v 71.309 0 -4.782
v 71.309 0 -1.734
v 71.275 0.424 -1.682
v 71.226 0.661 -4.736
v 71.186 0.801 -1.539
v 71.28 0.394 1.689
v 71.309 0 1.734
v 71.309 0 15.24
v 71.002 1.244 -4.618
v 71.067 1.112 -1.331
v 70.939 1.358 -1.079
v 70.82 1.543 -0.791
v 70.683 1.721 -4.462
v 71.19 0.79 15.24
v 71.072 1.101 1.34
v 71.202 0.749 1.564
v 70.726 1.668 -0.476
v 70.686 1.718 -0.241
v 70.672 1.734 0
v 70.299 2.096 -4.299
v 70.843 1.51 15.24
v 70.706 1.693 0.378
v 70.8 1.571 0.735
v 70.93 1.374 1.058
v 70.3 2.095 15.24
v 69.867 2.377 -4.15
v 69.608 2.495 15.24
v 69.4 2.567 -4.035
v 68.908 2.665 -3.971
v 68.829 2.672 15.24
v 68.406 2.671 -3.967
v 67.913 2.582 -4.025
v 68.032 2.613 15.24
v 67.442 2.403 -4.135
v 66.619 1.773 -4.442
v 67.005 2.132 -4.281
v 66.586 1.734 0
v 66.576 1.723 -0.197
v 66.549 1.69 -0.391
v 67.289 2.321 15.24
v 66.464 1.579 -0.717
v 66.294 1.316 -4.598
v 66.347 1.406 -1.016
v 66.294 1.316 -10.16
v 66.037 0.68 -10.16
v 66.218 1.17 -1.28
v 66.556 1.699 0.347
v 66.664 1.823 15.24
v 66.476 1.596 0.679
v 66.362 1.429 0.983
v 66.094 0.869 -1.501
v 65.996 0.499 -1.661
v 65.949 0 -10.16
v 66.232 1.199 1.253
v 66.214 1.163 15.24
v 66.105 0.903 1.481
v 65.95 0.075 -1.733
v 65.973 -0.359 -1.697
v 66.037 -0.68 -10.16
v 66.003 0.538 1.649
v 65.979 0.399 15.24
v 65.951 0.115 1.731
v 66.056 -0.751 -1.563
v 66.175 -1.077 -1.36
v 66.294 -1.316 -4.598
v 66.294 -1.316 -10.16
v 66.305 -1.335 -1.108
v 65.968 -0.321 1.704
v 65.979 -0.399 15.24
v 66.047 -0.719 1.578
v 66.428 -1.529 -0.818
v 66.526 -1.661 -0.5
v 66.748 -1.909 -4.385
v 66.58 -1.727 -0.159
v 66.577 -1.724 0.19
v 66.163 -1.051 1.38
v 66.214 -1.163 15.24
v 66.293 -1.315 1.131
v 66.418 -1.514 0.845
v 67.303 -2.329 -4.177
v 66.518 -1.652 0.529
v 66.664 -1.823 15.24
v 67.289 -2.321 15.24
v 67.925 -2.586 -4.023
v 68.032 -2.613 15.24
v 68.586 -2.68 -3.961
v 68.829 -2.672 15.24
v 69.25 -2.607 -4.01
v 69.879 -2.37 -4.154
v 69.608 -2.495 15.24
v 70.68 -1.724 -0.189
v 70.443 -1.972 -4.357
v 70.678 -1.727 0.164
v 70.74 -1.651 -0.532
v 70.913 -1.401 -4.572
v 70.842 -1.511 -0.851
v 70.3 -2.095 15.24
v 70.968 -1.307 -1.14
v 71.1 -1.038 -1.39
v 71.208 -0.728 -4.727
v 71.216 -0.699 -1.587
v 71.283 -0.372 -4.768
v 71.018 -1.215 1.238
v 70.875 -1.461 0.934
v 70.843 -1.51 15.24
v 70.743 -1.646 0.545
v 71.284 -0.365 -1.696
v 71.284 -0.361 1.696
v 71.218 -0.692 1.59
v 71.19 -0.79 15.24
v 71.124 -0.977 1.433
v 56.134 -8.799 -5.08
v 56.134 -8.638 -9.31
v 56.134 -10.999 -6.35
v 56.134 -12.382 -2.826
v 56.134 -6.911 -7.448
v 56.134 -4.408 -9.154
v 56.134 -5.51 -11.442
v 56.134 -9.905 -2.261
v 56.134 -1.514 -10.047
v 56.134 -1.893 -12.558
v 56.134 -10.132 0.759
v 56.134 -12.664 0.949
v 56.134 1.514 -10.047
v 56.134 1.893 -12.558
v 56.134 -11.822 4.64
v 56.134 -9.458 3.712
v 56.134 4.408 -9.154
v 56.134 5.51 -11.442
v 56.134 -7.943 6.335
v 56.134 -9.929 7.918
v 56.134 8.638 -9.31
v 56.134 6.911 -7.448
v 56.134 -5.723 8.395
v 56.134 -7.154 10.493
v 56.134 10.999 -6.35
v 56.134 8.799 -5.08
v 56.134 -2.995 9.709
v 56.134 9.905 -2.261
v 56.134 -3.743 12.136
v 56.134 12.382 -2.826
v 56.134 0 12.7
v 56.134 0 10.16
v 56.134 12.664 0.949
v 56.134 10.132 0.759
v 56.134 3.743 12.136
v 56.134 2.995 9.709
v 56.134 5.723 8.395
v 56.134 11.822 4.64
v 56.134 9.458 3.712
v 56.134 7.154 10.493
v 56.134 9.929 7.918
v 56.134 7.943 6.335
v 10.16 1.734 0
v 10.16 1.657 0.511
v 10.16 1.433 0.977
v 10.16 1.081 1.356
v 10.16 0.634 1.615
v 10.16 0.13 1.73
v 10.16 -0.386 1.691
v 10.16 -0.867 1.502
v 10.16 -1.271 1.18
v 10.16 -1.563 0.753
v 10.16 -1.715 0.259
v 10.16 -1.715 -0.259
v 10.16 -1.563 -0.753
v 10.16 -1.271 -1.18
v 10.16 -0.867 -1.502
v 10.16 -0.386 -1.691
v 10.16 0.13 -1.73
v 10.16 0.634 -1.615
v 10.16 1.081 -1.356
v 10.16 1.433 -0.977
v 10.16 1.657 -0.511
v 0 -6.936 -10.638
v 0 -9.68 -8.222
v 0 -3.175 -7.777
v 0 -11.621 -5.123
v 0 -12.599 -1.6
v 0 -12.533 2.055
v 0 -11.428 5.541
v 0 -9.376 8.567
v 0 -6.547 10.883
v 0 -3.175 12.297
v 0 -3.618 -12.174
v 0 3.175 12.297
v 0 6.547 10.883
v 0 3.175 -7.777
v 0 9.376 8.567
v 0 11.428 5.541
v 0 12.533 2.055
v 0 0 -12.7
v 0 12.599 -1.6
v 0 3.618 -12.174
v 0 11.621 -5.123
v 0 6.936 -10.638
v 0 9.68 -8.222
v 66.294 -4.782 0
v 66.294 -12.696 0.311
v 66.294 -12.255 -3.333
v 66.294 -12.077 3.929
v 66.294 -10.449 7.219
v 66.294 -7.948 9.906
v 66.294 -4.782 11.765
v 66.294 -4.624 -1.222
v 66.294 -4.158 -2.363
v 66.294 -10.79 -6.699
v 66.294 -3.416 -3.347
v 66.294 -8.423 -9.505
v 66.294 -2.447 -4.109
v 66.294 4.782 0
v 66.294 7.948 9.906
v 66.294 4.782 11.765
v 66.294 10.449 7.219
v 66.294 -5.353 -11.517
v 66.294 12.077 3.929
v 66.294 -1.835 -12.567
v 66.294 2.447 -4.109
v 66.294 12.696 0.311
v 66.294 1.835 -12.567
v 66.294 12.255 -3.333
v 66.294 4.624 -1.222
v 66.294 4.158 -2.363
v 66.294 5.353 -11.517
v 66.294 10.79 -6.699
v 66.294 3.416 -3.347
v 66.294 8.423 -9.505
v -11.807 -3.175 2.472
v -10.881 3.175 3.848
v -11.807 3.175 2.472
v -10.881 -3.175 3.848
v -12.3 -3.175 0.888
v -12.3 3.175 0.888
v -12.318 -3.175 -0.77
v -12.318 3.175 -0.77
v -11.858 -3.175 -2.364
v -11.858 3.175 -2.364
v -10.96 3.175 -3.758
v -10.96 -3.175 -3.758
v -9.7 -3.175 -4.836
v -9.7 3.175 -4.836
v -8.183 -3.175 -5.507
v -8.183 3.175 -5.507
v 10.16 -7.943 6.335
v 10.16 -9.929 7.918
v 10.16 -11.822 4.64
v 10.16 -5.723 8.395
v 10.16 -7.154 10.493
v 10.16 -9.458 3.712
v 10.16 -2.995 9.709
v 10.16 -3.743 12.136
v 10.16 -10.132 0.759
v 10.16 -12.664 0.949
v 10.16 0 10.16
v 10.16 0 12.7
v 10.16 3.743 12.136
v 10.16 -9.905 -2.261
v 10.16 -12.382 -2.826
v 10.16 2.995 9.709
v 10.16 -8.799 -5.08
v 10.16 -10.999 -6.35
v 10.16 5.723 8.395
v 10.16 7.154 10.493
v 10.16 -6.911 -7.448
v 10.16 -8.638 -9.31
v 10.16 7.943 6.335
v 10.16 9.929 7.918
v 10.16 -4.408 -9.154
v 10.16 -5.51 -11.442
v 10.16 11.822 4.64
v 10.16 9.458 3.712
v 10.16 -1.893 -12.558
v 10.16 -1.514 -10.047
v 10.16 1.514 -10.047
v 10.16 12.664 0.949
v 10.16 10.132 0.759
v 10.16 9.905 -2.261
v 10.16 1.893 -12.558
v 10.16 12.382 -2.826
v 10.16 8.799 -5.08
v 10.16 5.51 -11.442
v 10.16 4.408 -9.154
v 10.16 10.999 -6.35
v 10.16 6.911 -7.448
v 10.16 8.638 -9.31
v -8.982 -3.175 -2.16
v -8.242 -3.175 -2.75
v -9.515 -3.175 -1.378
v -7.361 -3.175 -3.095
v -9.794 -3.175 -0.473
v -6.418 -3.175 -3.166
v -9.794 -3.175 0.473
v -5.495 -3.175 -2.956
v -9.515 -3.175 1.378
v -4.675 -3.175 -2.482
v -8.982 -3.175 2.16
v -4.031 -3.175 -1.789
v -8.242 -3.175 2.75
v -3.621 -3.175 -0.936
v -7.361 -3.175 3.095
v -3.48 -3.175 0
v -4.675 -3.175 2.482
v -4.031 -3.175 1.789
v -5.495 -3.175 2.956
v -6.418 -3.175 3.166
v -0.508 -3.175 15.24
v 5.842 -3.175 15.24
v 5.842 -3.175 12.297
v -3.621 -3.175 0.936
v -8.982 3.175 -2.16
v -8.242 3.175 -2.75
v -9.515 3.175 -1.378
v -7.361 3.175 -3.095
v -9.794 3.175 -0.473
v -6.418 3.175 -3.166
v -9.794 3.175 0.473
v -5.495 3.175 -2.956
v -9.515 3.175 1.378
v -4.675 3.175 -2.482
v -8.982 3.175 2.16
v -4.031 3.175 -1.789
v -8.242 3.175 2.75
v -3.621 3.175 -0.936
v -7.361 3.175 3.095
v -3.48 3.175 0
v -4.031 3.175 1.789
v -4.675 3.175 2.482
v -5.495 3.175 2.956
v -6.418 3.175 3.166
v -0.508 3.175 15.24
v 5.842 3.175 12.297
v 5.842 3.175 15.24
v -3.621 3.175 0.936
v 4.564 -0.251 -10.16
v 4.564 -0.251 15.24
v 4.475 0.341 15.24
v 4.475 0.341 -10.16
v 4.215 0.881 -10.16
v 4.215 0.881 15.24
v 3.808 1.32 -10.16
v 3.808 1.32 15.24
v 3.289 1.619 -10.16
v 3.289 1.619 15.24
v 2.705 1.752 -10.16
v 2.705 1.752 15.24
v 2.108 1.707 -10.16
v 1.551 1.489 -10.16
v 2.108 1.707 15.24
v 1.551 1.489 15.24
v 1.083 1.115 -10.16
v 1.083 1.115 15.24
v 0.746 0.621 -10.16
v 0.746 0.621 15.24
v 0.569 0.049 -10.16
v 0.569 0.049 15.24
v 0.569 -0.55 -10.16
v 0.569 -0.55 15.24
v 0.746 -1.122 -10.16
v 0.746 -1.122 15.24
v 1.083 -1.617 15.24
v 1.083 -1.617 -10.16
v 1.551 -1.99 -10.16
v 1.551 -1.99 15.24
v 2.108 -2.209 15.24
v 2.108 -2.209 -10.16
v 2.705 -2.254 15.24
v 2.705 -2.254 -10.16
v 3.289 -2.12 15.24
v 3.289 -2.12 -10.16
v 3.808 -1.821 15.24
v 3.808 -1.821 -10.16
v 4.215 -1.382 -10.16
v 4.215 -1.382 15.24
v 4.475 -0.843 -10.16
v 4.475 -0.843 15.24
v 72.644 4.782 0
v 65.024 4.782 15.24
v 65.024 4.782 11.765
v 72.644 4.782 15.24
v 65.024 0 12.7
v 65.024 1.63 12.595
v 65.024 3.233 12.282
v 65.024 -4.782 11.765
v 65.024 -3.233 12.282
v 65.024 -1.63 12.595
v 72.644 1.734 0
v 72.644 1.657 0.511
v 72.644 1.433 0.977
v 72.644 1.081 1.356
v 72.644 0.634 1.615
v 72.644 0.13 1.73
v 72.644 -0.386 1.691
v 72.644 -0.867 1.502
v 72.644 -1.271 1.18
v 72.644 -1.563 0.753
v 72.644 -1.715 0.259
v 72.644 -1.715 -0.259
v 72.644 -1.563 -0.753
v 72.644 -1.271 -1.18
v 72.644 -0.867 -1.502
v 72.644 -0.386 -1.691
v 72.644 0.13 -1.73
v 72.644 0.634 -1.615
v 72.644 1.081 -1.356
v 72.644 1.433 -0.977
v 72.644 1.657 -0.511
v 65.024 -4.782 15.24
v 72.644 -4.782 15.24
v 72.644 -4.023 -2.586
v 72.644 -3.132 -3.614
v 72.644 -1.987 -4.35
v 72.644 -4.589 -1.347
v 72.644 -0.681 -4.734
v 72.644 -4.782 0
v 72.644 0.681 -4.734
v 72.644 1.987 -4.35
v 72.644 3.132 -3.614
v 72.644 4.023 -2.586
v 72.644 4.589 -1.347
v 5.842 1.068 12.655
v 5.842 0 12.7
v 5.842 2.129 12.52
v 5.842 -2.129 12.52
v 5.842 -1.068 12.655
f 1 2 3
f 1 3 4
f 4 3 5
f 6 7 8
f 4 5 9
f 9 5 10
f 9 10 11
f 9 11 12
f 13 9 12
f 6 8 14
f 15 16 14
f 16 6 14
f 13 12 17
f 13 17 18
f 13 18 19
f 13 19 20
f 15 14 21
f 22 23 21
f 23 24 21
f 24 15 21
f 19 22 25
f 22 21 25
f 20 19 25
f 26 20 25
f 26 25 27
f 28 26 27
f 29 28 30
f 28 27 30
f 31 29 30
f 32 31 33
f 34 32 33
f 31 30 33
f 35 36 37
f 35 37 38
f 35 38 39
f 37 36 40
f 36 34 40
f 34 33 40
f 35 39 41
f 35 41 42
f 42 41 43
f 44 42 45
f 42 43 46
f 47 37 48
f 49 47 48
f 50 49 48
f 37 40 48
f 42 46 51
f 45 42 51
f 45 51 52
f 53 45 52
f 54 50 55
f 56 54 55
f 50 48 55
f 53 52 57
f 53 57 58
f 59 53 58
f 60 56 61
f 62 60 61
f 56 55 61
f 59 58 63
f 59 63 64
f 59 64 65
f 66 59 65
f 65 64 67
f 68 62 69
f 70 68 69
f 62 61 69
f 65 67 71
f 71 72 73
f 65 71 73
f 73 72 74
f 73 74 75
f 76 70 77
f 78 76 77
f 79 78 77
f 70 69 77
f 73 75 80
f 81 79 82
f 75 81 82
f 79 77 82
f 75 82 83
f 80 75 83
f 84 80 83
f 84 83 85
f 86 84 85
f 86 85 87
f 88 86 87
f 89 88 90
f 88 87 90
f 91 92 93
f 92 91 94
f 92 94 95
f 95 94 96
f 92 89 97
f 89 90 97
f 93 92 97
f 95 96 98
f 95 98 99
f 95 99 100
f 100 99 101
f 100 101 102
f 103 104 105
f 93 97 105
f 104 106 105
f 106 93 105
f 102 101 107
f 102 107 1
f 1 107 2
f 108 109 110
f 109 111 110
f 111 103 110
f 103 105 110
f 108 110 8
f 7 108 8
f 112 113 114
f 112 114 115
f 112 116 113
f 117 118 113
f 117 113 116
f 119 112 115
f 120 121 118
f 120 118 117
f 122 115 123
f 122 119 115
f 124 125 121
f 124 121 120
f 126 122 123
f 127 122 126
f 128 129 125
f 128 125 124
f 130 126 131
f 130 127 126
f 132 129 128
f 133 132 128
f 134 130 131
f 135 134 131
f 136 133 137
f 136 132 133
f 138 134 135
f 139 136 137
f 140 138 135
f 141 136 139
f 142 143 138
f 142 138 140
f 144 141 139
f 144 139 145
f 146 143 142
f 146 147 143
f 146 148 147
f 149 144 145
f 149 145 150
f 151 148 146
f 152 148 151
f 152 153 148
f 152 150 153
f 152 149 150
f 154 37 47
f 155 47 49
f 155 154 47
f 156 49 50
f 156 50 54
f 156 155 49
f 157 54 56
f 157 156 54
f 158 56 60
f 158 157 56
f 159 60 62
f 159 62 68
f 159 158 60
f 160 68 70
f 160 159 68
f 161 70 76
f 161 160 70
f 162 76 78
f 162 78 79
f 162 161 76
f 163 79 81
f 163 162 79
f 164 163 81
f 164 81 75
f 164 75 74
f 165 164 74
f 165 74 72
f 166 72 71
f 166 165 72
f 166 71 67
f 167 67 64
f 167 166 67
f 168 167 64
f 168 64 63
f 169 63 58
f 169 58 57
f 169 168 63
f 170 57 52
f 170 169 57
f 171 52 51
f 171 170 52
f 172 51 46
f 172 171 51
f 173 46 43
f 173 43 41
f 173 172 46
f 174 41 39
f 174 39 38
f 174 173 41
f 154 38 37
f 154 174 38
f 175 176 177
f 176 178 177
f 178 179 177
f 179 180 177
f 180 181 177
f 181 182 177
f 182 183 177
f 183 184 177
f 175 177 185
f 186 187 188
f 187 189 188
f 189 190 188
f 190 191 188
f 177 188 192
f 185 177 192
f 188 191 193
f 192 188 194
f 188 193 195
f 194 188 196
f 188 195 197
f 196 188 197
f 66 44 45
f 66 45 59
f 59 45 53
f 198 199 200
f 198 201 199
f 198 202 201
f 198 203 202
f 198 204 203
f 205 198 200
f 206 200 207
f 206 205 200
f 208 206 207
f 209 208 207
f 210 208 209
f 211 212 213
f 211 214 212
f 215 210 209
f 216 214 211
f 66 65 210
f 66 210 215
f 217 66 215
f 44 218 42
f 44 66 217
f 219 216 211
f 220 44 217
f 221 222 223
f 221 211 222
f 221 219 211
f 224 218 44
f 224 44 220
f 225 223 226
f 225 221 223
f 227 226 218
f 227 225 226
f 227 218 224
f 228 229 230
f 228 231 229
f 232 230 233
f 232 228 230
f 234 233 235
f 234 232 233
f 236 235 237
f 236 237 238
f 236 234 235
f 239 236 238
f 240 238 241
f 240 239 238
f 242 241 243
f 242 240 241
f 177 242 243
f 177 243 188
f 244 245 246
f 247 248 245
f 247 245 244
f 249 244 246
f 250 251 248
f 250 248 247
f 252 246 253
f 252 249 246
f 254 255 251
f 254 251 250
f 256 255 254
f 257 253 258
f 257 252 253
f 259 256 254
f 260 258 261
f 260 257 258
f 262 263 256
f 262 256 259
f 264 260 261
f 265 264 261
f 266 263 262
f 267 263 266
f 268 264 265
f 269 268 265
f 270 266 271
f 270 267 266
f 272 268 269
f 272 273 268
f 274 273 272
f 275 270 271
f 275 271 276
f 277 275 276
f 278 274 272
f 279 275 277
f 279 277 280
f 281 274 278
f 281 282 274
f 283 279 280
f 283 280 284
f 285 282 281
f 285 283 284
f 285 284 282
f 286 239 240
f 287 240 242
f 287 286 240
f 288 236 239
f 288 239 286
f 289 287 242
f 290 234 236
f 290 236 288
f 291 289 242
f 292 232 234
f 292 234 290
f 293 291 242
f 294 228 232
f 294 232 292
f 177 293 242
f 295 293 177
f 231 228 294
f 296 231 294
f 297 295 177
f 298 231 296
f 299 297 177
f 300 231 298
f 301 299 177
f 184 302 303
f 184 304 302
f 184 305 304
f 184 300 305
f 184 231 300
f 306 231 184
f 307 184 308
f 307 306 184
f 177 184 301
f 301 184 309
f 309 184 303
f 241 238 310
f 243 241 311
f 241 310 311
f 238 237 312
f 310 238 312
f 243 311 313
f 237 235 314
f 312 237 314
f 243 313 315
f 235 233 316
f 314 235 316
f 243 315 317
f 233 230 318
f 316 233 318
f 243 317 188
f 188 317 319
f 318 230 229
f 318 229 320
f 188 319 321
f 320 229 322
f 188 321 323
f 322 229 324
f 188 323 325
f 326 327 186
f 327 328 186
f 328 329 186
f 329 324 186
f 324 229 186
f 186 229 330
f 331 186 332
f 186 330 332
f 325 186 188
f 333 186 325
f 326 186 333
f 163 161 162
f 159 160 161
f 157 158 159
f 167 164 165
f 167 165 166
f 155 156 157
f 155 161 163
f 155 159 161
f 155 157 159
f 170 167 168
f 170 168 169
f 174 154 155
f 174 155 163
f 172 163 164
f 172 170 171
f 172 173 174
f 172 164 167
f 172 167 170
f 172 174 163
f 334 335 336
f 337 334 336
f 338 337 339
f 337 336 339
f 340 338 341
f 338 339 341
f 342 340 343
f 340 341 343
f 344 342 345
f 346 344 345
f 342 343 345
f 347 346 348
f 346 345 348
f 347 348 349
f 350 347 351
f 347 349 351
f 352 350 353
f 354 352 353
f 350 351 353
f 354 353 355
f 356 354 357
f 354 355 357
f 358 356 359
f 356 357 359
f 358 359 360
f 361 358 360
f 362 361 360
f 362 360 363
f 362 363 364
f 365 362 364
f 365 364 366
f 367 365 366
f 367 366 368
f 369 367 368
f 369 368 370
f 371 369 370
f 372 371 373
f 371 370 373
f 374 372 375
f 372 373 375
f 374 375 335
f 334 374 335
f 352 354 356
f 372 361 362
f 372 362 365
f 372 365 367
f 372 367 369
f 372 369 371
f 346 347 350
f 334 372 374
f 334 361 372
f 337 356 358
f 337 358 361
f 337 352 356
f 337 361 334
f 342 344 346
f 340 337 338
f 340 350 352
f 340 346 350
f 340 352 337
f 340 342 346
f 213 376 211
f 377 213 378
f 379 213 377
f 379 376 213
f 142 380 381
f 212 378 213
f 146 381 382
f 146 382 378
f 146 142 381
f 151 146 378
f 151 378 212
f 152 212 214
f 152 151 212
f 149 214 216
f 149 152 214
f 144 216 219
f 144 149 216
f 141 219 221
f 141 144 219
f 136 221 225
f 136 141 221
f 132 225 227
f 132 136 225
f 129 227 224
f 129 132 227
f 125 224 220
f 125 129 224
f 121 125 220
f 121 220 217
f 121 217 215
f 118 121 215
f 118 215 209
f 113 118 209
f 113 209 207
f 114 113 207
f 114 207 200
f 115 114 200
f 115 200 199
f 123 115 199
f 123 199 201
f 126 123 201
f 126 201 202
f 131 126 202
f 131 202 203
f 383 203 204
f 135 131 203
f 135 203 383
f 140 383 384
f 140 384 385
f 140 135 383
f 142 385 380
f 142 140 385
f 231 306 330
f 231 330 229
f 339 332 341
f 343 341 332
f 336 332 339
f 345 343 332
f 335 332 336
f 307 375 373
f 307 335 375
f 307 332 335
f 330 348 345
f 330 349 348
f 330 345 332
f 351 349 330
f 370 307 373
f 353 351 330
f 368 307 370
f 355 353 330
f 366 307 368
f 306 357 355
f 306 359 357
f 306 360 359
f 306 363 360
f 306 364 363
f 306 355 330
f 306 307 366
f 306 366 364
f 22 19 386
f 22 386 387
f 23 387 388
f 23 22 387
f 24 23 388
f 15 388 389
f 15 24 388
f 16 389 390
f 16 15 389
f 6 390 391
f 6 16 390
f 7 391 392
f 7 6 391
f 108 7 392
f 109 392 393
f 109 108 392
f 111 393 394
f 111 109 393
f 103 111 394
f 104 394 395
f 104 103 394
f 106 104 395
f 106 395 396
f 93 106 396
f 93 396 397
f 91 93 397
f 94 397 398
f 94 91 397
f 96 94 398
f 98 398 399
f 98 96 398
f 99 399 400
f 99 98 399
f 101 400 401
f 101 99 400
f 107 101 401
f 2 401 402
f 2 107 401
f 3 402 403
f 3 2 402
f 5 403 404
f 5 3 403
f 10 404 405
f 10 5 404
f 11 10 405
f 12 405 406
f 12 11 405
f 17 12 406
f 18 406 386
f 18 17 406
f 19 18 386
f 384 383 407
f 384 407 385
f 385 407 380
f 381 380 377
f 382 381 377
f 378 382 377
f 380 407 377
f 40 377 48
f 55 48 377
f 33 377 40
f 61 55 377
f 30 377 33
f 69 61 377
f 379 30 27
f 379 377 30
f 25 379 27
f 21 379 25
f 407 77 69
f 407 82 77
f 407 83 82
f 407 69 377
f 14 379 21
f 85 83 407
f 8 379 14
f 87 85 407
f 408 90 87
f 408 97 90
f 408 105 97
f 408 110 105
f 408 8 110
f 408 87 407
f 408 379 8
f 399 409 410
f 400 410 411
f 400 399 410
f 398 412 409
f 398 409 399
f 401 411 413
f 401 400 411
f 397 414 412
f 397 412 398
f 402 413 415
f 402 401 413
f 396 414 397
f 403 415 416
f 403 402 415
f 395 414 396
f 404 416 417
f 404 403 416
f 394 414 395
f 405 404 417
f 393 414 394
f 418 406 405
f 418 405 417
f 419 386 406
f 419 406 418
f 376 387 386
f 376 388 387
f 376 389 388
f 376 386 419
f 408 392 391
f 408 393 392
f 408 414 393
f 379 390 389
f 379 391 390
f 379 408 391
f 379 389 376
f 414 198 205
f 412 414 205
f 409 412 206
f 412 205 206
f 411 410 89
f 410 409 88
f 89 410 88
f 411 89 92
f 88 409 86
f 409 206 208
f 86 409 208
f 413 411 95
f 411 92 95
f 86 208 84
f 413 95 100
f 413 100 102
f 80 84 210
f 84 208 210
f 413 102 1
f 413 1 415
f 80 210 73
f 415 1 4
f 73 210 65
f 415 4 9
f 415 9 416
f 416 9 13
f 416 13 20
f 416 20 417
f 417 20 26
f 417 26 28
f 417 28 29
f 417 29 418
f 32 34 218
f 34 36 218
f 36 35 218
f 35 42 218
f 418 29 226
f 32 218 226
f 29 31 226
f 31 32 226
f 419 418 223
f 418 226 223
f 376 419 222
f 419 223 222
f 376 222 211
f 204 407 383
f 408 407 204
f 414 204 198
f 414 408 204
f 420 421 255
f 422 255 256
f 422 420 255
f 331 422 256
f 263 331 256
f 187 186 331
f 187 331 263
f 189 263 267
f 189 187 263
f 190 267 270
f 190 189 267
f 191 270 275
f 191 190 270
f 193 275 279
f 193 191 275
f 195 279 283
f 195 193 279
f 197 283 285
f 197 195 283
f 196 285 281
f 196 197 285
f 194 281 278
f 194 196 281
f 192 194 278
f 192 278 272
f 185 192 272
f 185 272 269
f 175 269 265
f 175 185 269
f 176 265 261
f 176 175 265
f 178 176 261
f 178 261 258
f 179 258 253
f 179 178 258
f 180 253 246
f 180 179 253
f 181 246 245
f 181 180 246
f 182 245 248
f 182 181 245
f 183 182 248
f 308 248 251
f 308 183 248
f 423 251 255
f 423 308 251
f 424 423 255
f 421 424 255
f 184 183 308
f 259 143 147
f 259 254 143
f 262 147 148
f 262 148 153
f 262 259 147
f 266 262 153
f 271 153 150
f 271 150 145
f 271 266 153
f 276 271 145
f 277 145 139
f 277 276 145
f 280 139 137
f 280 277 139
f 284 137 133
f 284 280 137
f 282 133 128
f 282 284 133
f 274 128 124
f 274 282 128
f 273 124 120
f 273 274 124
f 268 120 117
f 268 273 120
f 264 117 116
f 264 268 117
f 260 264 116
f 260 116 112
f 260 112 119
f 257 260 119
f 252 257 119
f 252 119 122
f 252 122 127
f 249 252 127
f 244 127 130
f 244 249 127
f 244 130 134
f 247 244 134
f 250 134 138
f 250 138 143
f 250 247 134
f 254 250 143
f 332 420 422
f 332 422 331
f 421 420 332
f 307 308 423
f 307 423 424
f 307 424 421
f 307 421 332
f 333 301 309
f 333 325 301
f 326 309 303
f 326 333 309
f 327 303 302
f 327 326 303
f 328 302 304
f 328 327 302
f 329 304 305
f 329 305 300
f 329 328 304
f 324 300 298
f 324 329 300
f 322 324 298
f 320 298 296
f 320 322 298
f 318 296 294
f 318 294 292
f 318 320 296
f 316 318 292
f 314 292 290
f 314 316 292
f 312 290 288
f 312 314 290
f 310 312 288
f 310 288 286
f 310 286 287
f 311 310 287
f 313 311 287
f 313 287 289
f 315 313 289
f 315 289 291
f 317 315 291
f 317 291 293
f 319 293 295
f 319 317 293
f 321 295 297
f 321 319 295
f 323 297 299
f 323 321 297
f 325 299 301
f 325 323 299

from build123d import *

# Parameters (mm, degrees)
F0_W          = 5.842
F0_H          = 12.7
F0_R          = 3.175
F2_DEPTH      = 3.175
F3_R          = 1.7344184536
F4_DEPTH      = 6.35
F4_DEPTH_BACK = 1.27
F5_DEPTH      = 56.134
F6_R          = 2.6798601648
F7_DEPTH      = 25.4
F8_R          = 2.0084495131
F9_DEPTH      = 25.4


with BuildPart() as f1:
    # F0 (on Front) → F1 (revolve)
    with BuildSketch(Plane.XZ):
        Polygon((5.842, 12.7), (5.842, 0), (66.294, 0), (66.294, 12.7), (56.134, 12.7), (56.134, 10.16), (10.16, 10.16), (10.16, 12.7), align=None)
        with Locations((2.921, 6.35)):
            Rectangle(F0_W, F0_H)
    revolve(axis=Axis((33.147, 0, 0), (-1, 0, 0)))

    # F0 (on Front) → F2 (join, symmetric)
    with BuildSketch(Plane.XZ):
        with Locations((2.921, 6.35)):
            Rectangle(F0_W, F0_H)
        with BuildLine():
            Line((-0.9398, 0), (0, 0))
            Line((0, 0), (0, 12.7))
            Line((0, 12.7), (5.842, 12.7))
            Line((5.842, 12.7), (5.842, 15.24))
            Line((5.842, 15.24), (-0.508, 15.24))
            Line((-0.508, 15.24), (-10.8806298187, 3.8475430269))
            ThreePointArc((-10.8806298187, 3.8475430269), (-4.5919612295, 5.3297205562), (-0.9398, 0))
        make_face()
        with BuildLine():
            Line((5.842, 0), (0, 0))
            Line((0, 0), (-0.9398, 0))
            ThreePointArc((-0.9398, 0), (-3.1957909266, -4.5493385486), (-8.1826630726, -5.5069827884))
            Line((-8.1826630726, -5.5069827884), (5.842, -9.398))
            Line((5.842, -9.398), (5.842, 0))
        make_face()
        with BuildLine():
            ThreePointArc((-8.1826630726, -5.5069827884), (-3.1957909266, -4.5493385486), (-0.9398, 0))
            ThreePointArc((-0.9398, 0), (-4.5919612295, 5.3297205562), (-10.8806298187, 3.8475430269))
            ThreePointArc((-10.8806298187, 3.8475430269), (-12.1459778134, -1.5837270034), (-8.1826630726, -5.5069827884))
        make_face()
        with Locations((-6.6548, 0)):
            Circle(F0_R, mode=Mode.SUBTRACT)
    extrude(amount=F2_DEPTH, both=True)

    # F3 (on face) → F4 (join, two sides)
    with BuildSketch(Plane.YZ.offset(66.294)) as f4_sk:
        with BuildLine():
            ThreePointArc((-4.7824184536, 0), (0, -4.7824184536), (4.7824184536, 0))
            ThreePointArc((4.7824184536, 0), (0, 4.7824184536), (-4.7824184536, 0))
        make_face()
        Circle(F3_R, mode=Mode.SUBTRACT)
        with BuildLine():
            ThreePointArc((-4.7824184536, 0), (0, 4.7824184536), (4.7824184536, 0))
            Line((4.7824184536, 0), (4.7824184536, 15.24))
            Line((4.7824184536, 15.24), (-4.7824184536, 15.24))
            Line((-4.7824184536, 15.24), (-4.7824184536, 0))
        make_face()
    extrude(amount=F4_DEPTH)
    extrude(f4_sk.sketch, amount=-F4_DEPTH_BACK)

    # F5 (cut, through all): a face of the model
    f5_faces = [f1.faces().sort_by_distance(p)[0] for p in [
        (66.294, 0, 0),
    ]]
    extrude(f5_faces, amount=-F5_DEPTH, mode=Mode.SUBTRACT)

    # F6 (on face) → F7 (cut)
    with BuildSketch(Plane.XY.offset(15.24)):
        with Locations((68.6287283897, 0)):
            Circle(F6_R)
    extrude(amount=-F7_DEPTH, mode=Mode.SUBTRACT)

    # F8 (on face) → F9 (cut)
    with BuildSketch(Plane.XY.offset(15.24)):
        with Locations((2.5553756859, -0.2507429745)):
            Circle(F8_R)
    extrude(amount=-F9_DEPTH, mode=Mode.SUBTRACT)


solid = f1.part
